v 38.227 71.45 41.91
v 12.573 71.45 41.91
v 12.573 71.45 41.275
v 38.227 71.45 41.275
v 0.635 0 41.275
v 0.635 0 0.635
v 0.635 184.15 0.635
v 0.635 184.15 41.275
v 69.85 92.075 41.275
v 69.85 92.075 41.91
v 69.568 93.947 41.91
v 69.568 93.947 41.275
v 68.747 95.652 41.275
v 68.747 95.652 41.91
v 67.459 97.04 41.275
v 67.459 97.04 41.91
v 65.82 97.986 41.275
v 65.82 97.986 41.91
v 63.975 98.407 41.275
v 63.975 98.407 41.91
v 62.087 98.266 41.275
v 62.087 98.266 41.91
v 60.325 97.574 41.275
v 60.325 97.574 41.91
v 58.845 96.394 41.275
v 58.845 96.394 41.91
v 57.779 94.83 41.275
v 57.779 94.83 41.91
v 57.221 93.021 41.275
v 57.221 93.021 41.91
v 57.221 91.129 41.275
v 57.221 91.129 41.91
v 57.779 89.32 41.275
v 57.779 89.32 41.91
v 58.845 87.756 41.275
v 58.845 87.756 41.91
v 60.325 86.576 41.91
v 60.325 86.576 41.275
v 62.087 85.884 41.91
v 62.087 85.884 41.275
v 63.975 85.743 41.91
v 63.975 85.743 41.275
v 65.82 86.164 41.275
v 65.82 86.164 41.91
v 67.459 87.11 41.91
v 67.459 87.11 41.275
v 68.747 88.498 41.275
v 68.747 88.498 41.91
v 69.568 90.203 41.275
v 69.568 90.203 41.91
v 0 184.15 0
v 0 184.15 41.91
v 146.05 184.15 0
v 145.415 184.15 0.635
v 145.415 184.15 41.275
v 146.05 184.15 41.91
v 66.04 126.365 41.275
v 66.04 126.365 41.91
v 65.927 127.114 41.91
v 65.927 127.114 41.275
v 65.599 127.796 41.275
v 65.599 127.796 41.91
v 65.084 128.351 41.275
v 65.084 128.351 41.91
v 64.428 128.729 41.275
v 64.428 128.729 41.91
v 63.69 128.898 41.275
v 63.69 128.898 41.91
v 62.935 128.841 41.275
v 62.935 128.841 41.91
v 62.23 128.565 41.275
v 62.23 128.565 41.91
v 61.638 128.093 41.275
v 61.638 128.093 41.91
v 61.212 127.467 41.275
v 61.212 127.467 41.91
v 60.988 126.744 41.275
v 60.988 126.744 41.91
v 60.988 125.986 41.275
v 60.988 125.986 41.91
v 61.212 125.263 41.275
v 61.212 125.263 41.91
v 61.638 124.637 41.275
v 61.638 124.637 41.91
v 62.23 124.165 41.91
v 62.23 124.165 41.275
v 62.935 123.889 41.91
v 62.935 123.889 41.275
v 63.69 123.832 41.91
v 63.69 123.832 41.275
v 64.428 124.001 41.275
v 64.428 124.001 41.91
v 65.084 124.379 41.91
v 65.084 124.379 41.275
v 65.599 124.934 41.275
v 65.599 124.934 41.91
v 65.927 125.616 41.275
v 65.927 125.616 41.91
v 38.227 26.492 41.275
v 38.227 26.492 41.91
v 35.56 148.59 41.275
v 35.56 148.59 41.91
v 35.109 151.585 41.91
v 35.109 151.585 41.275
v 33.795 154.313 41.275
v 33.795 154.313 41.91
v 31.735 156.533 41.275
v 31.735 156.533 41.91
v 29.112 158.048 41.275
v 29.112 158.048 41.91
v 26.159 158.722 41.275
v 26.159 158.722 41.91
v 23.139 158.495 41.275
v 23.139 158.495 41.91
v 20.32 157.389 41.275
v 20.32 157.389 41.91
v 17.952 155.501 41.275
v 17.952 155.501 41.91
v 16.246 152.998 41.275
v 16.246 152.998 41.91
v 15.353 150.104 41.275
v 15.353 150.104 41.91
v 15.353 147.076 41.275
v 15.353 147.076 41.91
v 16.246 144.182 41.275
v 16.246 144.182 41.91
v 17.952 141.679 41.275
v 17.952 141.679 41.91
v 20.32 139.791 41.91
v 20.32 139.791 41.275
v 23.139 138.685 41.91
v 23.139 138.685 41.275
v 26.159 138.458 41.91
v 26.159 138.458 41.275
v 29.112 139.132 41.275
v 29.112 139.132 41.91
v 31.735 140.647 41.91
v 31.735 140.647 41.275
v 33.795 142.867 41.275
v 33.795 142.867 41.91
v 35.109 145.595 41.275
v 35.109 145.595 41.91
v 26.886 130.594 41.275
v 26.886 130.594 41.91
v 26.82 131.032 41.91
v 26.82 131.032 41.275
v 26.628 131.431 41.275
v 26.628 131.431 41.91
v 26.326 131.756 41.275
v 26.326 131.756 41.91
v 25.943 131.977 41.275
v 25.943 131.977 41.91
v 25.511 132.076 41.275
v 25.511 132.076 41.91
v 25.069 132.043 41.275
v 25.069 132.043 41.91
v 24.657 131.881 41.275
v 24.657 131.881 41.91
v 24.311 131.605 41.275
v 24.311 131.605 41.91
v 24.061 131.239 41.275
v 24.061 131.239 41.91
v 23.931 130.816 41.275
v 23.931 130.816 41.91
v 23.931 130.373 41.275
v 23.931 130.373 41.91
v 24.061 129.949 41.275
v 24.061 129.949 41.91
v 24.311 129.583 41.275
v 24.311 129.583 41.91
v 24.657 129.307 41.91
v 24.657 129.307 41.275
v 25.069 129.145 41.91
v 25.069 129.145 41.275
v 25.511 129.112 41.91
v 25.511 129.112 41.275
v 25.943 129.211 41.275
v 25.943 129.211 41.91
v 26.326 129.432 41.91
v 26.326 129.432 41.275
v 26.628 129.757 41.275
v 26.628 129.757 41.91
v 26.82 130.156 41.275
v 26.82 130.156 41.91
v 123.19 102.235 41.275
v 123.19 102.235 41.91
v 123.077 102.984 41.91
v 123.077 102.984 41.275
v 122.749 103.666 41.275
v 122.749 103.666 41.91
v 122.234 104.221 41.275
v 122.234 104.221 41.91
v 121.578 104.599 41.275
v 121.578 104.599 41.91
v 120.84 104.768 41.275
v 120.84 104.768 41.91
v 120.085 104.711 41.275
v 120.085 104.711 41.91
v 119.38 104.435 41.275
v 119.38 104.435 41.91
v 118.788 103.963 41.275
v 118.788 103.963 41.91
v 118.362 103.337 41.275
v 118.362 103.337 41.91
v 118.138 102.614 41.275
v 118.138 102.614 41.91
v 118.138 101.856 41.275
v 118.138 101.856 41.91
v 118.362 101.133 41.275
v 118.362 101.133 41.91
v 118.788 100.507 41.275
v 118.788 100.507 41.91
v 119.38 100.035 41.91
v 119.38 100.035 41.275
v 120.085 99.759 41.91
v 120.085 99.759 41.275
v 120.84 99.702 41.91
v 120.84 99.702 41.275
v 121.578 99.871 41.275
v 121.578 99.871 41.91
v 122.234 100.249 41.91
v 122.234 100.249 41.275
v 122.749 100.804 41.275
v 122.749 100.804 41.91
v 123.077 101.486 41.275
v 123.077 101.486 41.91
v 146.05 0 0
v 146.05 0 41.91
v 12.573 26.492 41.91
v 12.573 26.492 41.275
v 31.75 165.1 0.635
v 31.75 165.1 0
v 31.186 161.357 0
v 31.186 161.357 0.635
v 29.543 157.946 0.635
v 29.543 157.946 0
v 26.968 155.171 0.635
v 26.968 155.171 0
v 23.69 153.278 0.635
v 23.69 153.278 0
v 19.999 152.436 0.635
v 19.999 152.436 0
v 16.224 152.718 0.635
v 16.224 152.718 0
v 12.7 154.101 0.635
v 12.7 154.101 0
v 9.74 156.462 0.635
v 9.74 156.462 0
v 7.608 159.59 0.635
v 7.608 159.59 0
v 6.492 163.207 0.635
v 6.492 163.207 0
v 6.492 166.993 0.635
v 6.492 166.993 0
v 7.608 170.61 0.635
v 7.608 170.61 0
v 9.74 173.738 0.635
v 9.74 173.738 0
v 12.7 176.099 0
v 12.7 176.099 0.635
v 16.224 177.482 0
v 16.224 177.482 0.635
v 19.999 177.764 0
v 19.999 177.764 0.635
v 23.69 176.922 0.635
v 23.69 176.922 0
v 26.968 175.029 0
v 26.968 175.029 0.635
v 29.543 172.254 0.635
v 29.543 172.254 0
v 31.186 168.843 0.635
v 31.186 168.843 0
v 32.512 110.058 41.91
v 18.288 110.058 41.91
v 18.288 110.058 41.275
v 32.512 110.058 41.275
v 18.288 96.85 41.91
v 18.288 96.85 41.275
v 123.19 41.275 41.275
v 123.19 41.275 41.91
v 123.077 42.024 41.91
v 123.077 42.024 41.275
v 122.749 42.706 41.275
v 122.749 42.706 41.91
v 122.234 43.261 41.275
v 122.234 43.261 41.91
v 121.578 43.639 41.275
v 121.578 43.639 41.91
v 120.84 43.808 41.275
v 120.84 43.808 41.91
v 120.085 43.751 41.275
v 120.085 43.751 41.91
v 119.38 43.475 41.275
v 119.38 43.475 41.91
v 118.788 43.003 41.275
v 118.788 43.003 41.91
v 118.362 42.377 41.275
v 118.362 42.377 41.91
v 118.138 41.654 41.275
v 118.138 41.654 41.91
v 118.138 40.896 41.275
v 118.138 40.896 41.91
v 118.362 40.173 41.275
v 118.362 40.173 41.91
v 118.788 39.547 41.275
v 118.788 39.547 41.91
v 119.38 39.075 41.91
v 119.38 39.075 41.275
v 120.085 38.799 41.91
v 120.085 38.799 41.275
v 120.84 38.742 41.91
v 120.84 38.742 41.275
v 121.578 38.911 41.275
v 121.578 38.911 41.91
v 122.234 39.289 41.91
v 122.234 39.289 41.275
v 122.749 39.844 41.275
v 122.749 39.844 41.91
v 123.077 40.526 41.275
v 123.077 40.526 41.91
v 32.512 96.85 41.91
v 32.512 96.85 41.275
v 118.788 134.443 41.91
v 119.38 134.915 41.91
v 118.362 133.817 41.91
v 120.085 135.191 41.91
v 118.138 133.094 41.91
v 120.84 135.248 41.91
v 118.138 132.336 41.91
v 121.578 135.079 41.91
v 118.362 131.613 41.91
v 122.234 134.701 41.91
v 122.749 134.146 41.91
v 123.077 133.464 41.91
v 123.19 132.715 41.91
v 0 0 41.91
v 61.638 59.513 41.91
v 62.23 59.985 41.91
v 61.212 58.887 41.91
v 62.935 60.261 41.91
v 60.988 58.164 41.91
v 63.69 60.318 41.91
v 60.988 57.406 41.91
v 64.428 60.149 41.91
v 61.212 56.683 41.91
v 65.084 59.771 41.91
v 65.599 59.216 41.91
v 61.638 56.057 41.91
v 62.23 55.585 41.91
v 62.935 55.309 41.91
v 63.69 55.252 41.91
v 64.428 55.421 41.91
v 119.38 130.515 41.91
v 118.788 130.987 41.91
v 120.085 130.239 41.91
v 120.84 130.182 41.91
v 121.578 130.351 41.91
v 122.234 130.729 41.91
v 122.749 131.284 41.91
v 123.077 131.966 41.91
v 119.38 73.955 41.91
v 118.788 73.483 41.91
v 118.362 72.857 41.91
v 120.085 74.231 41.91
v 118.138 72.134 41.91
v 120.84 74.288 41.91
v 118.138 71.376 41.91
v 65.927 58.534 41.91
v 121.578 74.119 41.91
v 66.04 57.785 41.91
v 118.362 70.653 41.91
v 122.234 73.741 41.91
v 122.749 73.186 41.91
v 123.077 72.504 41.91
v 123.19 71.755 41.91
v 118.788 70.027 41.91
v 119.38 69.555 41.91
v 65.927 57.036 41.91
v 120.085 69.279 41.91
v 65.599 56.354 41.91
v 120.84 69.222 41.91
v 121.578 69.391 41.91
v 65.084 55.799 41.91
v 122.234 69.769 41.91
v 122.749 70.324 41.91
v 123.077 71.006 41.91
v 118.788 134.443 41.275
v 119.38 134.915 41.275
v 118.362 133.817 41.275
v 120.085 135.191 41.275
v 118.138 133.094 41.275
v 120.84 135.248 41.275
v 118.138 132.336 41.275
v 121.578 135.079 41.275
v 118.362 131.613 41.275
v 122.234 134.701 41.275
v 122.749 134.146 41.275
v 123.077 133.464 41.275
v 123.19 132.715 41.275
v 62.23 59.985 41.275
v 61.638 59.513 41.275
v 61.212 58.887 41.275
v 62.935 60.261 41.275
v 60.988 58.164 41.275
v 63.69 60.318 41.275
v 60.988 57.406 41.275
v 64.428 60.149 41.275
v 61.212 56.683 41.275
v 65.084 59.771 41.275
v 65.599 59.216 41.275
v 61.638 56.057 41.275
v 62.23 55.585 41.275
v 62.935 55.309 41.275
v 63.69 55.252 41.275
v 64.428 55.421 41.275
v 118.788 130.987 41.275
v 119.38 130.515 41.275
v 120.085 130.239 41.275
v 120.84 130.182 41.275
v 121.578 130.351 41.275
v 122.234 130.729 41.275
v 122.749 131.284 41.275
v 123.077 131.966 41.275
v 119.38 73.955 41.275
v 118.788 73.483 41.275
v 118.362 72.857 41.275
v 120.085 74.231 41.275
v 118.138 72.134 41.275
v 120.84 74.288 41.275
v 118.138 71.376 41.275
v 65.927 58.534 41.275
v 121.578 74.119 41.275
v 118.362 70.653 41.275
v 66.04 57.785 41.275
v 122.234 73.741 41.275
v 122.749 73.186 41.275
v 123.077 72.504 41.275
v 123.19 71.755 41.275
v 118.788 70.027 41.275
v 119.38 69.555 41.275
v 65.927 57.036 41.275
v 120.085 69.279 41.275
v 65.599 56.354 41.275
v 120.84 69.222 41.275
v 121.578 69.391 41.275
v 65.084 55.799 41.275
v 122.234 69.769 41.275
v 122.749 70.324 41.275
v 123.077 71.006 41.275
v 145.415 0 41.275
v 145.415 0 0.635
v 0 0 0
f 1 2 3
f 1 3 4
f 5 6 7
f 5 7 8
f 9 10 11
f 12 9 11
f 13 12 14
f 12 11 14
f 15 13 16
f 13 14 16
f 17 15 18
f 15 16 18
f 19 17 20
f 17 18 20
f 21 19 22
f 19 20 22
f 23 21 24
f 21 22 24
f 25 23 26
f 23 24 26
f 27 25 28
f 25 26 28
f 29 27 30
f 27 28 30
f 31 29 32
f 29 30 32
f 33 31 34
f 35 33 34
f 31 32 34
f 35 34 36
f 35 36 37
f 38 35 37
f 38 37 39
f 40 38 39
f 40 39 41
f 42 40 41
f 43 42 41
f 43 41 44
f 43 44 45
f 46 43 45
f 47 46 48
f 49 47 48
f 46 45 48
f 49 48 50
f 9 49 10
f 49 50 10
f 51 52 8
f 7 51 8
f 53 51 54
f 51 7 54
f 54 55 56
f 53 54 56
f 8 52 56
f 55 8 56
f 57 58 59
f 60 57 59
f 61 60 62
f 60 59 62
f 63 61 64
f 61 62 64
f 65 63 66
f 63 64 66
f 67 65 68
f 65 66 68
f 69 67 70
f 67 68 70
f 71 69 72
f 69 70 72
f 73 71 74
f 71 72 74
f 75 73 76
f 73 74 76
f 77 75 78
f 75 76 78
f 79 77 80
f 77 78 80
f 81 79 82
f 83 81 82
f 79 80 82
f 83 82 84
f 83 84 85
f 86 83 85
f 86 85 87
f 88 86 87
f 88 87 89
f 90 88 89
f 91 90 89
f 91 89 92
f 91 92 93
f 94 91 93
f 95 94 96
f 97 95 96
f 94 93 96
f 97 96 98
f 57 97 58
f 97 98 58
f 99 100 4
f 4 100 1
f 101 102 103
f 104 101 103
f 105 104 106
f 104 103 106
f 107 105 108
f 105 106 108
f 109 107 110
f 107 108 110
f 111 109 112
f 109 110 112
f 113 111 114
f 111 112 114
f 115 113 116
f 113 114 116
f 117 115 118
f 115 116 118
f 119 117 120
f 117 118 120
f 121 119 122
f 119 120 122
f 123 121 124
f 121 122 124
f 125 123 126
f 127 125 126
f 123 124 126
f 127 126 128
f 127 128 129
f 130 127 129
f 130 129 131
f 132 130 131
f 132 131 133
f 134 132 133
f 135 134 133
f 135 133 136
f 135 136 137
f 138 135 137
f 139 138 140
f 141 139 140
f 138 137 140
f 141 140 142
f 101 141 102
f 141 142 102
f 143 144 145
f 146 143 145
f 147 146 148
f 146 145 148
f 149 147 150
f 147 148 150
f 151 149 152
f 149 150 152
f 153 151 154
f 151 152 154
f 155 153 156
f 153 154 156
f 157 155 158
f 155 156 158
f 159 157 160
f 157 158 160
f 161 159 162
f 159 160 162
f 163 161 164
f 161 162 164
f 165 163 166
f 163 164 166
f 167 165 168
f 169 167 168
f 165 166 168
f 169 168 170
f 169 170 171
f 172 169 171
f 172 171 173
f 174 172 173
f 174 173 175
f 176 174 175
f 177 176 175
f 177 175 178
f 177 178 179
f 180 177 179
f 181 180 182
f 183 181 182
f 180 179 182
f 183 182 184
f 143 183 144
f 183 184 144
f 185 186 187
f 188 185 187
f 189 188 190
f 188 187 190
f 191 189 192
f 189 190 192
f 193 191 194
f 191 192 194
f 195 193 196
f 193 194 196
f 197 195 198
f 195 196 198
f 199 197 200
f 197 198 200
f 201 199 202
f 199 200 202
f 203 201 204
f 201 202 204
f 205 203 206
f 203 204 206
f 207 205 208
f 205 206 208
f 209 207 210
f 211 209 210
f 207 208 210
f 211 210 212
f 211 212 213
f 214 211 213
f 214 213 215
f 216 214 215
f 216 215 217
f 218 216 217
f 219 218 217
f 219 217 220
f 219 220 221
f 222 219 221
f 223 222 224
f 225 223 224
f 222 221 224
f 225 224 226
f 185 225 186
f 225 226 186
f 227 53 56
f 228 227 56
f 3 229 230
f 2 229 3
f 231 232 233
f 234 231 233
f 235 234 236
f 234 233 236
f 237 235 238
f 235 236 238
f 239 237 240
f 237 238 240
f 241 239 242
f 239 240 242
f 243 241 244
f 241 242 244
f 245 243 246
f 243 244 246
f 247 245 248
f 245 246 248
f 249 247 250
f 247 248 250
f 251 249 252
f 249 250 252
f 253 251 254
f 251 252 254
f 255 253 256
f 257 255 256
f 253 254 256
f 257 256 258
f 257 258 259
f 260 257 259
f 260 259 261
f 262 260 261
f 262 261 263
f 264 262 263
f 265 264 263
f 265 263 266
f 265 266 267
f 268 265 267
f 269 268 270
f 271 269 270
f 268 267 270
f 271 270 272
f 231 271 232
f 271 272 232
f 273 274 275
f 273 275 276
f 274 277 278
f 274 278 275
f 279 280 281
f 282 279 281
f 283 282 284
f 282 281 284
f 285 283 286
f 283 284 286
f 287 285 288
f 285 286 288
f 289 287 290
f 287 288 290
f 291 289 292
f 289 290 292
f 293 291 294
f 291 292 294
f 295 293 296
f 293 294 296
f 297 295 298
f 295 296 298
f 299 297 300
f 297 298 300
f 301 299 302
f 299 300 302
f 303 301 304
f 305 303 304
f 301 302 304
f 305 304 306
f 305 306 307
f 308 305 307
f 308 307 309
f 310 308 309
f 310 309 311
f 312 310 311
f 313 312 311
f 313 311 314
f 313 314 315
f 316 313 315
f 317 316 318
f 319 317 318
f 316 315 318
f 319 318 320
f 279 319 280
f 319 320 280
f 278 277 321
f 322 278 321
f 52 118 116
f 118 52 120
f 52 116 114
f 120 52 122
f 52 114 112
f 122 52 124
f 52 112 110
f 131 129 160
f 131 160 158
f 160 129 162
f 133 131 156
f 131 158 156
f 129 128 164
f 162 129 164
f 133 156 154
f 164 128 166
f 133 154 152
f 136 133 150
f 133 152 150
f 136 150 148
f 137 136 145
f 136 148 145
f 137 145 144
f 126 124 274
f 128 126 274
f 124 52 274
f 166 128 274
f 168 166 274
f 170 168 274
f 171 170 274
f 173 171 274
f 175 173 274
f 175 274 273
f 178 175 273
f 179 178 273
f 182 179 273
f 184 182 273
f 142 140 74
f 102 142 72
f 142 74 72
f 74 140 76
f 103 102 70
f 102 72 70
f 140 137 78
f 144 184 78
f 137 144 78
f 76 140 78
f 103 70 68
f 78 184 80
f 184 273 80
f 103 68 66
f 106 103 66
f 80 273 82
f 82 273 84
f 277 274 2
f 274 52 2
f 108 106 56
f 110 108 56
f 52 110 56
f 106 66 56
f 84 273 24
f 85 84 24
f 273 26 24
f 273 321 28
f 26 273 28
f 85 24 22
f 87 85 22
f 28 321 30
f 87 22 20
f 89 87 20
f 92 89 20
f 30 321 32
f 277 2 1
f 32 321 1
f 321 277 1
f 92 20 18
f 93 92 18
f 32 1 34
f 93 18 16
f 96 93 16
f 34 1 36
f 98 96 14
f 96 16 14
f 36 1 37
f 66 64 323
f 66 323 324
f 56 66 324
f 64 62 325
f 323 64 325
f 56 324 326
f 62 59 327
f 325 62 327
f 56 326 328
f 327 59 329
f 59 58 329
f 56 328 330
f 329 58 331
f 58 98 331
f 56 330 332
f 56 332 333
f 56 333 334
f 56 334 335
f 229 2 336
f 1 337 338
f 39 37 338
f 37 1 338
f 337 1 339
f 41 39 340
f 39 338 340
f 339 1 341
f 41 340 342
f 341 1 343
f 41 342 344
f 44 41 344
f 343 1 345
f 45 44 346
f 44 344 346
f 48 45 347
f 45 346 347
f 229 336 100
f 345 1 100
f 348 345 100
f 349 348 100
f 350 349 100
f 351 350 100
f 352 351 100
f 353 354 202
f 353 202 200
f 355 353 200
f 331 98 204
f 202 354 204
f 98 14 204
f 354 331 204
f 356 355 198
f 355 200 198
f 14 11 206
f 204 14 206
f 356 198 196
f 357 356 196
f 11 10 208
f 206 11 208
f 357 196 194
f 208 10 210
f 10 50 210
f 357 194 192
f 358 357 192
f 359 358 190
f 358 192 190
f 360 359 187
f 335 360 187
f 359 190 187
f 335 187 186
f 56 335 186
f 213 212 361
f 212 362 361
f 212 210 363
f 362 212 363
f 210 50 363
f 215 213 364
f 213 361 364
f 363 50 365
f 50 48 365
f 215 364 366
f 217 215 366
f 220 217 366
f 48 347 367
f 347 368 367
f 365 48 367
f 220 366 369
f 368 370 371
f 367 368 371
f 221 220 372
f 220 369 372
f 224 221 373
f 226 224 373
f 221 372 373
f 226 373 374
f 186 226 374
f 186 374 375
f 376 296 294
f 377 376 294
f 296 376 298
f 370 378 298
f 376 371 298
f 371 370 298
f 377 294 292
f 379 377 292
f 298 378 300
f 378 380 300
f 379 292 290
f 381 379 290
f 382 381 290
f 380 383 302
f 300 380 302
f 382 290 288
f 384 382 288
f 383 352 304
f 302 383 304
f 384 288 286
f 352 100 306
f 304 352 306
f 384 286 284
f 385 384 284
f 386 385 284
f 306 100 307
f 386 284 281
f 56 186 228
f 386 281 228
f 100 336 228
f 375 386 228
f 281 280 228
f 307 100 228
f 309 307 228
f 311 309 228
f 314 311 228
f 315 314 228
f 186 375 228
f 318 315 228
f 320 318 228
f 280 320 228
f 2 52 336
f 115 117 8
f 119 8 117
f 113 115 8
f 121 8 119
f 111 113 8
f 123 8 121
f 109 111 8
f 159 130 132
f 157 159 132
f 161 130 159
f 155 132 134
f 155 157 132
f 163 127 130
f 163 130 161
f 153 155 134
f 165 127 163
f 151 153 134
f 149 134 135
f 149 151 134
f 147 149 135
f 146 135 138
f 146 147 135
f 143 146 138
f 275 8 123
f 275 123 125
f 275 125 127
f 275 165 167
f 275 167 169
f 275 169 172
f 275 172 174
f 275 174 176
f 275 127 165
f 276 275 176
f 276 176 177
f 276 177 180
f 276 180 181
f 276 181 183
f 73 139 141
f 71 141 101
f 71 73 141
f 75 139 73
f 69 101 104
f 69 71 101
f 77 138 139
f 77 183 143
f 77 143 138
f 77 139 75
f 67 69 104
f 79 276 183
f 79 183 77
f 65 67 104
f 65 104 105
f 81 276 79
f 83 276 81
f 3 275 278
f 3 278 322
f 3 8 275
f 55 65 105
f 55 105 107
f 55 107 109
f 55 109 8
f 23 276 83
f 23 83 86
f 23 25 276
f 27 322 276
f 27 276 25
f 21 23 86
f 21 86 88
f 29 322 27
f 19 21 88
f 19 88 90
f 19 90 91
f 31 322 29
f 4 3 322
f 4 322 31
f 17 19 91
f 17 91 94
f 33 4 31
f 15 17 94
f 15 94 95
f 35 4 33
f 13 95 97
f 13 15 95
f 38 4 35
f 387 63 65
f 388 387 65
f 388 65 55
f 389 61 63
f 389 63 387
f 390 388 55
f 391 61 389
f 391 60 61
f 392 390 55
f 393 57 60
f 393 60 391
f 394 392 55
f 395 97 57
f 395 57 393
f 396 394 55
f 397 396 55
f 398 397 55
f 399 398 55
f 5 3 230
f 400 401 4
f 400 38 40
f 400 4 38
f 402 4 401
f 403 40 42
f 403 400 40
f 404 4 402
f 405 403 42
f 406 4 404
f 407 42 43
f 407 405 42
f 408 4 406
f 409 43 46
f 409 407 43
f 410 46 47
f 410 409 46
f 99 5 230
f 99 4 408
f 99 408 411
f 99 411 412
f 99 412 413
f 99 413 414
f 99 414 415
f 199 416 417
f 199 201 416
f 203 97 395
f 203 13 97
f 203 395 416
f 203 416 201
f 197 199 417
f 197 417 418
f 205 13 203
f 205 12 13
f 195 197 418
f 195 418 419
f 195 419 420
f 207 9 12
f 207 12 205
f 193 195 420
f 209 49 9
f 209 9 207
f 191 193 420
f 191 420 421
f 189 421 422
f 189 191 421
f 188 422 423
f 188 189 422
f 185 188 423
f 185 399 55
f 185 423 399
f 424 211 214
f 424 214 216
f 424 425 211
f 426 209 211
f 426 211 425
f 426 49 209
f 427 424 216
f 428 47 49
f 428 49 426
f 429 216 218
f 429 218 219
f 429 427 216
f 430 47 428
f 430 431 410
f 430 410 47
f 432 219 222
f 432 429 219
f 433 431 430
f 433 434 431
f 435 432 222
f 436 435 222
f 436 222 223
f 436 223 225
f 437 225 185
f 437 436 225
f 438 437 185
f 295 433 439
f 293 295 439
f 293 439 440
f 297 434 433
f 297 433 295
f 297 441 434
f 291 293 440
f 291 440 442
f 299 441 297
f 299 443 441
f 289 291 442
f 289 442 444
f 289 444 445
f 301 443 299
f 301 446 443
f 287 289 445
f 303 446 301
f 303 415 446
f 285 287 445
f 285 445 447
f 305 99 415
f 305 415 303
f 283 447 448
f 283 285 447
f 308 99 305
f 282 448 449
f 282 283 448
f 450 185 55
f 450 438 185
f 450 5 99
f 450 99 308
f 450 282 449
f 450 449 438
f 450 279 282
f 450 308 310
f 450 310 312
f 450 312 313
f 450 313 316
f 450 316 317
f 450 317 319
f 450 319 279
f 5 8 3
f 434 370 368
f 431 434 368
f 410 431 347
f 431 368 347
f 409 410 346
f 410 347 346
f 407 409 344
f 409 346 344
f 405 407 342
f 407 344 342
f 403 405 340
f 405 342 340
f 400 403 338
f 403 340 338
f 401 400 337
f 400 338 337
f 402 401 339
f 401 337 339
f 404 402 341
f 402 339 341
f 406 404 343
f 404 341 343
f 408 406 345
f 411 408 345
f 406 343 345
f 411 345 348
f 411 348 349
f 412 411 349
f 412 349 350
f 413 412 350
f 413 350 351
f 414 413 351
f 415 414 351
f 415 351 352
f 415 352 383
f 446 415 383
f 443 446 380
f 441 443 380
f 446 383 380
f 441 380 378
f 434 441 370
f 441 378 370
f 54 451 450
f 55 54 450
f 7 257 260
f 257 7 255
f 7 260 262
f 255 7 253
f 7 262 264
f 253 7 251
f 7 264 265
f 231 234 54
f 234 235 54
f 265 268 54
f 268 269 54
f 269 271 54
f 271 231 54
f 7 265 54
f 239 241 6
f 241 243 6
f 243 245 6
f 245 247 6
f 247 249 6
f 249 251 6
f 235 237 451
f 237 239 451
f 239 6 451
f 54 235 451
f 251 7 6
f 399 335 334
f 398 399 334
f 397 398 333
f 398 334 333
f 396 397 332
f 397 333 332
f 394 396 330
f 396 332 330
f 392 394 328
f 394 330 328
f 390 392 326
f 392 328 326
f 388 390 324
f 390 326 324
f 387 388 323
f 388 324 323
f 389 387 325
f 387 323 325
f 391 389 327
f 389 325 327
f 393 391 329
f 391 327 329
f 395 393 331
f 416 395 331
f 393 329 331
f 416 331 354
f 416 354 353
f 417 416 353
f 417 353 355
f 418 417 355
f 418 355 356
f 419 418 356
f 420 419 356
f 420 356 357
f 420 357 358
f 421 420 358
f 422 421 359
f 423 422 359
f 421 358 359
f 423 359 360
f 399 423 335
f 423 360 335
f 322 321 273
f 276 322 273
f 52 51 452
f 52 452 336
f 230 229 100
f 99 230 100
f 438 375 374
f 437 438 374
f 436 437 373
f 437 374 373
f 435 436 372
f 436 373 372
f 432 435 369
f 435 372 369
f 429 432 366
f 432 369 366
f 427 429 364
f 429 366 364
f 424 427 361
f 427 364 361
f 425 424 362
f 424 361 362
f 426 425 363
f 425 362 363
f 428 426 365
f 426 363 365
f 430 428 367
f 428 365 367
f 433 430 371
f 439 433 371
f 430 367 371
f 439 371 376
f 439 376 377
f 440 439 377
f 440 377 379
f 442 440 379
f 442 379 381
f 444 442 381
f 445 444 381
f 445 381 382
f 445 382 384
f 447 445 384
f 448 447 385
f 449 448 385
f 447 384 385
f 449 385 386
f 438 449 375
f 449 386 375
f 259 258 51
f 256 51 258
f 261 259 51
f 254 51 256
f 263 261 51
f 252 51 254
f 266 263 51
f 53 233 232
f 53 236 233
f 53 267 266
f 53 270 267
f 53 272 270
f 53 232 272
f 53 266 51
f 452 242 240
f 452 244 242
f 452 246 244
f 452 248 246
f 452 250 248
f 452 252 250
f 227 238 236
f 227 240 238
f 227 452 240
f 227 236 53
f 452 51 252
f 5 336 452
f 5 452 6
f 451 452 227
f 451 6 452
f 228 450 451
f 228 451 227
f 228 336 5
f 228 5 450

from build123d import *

# Parameters (mm, degrees)
F0_W     = 146.05
F0_H     = 41.91
F0_W_2   = 144.78
F0_H_2   = 40.64
F1_DEPTH = 184.15
F2_R     = 12.7
F3_DEPTH = 0.635
F4_W     = 25.654
F4_H     = 44.958
F4_W_2   = 14.224
F4_H_2   = 13.208
F4_R     = 10.16
F4_R_2   = 6.35
F4_R_3   = 2.54
F5_DEPTH = 0.635
F4_R_4   = 1.4859
F6_DEPTH = 0.635


with BuildPart() as f1:
    # F0 (on Front) → F1 (new body)
    with BuildSketch(Plane.XZ):
        with Locations((73.025, 20.955)):
            Rectangle(F0_W, F0_H)
        with Locations((73.025, 20.955)):
            Rectangle(F0_W_2, F0_H_2, mode=Mode.SUBTRACT)
    extrude(amount=-F1_DEPTH)

    # F2 (on face) → F3 (cut, through all)
    with BuildSketch(Plane(origin=(0, 0, 0), x_dir=(1, 0, 0), z_dir=(0, 0, -1))):
        with Locations((19.05, -165.1)):
            Circle(F2_R)
    extrude(amount=-F3_DEPTH, mode=Mode.SUBTRACT)

    # F4 (on face) → F5 (cut, through all)
    with BuildSketch(Plane.XY.offset(41.91)):
        with Locations((25.4, 48.9712)):
            Rectangle(F4_W, F4_H)
        with Locations((25.4, 103.4542)):
            Rectangle(F4_W_2, F4_H_2)
        with Locations((25.4, 148.59)):
            Circle(F4_R)
        with Locations((63.5, 92.075)):
            Circle(F4_R_2)
        with Locations((63.5, 57.785)):
            Circle(F4_R_3)
        with Locations((120.65, 71.755)):
            Circle(F4_R_3)
        with Locations((120.65, 132.715)):
            Circle(F4_R_3)
    extrude(amount=-F5_DEPTH, mode=Mode.SUBTRACT)

    # F4 (on face) → F6 (cut, through all)
    with BuildSketch(Plane.XY.offset(41.91)):
        with Locations((25.4, 130.5941)):
            Circle(F4_R_4)
        with Locations((63.5, 126.365)):
            Circle(F4_R_3)
        with Locations((120.65, 102.235)):
            Circle(F4_R_3)
        with Locations((120.65, 41.275)):
            Circle(F4_R_3)
    extrude(amount=-F6_DEPTH, mode=Mode.SUBTRACT)


solid = f1.part
